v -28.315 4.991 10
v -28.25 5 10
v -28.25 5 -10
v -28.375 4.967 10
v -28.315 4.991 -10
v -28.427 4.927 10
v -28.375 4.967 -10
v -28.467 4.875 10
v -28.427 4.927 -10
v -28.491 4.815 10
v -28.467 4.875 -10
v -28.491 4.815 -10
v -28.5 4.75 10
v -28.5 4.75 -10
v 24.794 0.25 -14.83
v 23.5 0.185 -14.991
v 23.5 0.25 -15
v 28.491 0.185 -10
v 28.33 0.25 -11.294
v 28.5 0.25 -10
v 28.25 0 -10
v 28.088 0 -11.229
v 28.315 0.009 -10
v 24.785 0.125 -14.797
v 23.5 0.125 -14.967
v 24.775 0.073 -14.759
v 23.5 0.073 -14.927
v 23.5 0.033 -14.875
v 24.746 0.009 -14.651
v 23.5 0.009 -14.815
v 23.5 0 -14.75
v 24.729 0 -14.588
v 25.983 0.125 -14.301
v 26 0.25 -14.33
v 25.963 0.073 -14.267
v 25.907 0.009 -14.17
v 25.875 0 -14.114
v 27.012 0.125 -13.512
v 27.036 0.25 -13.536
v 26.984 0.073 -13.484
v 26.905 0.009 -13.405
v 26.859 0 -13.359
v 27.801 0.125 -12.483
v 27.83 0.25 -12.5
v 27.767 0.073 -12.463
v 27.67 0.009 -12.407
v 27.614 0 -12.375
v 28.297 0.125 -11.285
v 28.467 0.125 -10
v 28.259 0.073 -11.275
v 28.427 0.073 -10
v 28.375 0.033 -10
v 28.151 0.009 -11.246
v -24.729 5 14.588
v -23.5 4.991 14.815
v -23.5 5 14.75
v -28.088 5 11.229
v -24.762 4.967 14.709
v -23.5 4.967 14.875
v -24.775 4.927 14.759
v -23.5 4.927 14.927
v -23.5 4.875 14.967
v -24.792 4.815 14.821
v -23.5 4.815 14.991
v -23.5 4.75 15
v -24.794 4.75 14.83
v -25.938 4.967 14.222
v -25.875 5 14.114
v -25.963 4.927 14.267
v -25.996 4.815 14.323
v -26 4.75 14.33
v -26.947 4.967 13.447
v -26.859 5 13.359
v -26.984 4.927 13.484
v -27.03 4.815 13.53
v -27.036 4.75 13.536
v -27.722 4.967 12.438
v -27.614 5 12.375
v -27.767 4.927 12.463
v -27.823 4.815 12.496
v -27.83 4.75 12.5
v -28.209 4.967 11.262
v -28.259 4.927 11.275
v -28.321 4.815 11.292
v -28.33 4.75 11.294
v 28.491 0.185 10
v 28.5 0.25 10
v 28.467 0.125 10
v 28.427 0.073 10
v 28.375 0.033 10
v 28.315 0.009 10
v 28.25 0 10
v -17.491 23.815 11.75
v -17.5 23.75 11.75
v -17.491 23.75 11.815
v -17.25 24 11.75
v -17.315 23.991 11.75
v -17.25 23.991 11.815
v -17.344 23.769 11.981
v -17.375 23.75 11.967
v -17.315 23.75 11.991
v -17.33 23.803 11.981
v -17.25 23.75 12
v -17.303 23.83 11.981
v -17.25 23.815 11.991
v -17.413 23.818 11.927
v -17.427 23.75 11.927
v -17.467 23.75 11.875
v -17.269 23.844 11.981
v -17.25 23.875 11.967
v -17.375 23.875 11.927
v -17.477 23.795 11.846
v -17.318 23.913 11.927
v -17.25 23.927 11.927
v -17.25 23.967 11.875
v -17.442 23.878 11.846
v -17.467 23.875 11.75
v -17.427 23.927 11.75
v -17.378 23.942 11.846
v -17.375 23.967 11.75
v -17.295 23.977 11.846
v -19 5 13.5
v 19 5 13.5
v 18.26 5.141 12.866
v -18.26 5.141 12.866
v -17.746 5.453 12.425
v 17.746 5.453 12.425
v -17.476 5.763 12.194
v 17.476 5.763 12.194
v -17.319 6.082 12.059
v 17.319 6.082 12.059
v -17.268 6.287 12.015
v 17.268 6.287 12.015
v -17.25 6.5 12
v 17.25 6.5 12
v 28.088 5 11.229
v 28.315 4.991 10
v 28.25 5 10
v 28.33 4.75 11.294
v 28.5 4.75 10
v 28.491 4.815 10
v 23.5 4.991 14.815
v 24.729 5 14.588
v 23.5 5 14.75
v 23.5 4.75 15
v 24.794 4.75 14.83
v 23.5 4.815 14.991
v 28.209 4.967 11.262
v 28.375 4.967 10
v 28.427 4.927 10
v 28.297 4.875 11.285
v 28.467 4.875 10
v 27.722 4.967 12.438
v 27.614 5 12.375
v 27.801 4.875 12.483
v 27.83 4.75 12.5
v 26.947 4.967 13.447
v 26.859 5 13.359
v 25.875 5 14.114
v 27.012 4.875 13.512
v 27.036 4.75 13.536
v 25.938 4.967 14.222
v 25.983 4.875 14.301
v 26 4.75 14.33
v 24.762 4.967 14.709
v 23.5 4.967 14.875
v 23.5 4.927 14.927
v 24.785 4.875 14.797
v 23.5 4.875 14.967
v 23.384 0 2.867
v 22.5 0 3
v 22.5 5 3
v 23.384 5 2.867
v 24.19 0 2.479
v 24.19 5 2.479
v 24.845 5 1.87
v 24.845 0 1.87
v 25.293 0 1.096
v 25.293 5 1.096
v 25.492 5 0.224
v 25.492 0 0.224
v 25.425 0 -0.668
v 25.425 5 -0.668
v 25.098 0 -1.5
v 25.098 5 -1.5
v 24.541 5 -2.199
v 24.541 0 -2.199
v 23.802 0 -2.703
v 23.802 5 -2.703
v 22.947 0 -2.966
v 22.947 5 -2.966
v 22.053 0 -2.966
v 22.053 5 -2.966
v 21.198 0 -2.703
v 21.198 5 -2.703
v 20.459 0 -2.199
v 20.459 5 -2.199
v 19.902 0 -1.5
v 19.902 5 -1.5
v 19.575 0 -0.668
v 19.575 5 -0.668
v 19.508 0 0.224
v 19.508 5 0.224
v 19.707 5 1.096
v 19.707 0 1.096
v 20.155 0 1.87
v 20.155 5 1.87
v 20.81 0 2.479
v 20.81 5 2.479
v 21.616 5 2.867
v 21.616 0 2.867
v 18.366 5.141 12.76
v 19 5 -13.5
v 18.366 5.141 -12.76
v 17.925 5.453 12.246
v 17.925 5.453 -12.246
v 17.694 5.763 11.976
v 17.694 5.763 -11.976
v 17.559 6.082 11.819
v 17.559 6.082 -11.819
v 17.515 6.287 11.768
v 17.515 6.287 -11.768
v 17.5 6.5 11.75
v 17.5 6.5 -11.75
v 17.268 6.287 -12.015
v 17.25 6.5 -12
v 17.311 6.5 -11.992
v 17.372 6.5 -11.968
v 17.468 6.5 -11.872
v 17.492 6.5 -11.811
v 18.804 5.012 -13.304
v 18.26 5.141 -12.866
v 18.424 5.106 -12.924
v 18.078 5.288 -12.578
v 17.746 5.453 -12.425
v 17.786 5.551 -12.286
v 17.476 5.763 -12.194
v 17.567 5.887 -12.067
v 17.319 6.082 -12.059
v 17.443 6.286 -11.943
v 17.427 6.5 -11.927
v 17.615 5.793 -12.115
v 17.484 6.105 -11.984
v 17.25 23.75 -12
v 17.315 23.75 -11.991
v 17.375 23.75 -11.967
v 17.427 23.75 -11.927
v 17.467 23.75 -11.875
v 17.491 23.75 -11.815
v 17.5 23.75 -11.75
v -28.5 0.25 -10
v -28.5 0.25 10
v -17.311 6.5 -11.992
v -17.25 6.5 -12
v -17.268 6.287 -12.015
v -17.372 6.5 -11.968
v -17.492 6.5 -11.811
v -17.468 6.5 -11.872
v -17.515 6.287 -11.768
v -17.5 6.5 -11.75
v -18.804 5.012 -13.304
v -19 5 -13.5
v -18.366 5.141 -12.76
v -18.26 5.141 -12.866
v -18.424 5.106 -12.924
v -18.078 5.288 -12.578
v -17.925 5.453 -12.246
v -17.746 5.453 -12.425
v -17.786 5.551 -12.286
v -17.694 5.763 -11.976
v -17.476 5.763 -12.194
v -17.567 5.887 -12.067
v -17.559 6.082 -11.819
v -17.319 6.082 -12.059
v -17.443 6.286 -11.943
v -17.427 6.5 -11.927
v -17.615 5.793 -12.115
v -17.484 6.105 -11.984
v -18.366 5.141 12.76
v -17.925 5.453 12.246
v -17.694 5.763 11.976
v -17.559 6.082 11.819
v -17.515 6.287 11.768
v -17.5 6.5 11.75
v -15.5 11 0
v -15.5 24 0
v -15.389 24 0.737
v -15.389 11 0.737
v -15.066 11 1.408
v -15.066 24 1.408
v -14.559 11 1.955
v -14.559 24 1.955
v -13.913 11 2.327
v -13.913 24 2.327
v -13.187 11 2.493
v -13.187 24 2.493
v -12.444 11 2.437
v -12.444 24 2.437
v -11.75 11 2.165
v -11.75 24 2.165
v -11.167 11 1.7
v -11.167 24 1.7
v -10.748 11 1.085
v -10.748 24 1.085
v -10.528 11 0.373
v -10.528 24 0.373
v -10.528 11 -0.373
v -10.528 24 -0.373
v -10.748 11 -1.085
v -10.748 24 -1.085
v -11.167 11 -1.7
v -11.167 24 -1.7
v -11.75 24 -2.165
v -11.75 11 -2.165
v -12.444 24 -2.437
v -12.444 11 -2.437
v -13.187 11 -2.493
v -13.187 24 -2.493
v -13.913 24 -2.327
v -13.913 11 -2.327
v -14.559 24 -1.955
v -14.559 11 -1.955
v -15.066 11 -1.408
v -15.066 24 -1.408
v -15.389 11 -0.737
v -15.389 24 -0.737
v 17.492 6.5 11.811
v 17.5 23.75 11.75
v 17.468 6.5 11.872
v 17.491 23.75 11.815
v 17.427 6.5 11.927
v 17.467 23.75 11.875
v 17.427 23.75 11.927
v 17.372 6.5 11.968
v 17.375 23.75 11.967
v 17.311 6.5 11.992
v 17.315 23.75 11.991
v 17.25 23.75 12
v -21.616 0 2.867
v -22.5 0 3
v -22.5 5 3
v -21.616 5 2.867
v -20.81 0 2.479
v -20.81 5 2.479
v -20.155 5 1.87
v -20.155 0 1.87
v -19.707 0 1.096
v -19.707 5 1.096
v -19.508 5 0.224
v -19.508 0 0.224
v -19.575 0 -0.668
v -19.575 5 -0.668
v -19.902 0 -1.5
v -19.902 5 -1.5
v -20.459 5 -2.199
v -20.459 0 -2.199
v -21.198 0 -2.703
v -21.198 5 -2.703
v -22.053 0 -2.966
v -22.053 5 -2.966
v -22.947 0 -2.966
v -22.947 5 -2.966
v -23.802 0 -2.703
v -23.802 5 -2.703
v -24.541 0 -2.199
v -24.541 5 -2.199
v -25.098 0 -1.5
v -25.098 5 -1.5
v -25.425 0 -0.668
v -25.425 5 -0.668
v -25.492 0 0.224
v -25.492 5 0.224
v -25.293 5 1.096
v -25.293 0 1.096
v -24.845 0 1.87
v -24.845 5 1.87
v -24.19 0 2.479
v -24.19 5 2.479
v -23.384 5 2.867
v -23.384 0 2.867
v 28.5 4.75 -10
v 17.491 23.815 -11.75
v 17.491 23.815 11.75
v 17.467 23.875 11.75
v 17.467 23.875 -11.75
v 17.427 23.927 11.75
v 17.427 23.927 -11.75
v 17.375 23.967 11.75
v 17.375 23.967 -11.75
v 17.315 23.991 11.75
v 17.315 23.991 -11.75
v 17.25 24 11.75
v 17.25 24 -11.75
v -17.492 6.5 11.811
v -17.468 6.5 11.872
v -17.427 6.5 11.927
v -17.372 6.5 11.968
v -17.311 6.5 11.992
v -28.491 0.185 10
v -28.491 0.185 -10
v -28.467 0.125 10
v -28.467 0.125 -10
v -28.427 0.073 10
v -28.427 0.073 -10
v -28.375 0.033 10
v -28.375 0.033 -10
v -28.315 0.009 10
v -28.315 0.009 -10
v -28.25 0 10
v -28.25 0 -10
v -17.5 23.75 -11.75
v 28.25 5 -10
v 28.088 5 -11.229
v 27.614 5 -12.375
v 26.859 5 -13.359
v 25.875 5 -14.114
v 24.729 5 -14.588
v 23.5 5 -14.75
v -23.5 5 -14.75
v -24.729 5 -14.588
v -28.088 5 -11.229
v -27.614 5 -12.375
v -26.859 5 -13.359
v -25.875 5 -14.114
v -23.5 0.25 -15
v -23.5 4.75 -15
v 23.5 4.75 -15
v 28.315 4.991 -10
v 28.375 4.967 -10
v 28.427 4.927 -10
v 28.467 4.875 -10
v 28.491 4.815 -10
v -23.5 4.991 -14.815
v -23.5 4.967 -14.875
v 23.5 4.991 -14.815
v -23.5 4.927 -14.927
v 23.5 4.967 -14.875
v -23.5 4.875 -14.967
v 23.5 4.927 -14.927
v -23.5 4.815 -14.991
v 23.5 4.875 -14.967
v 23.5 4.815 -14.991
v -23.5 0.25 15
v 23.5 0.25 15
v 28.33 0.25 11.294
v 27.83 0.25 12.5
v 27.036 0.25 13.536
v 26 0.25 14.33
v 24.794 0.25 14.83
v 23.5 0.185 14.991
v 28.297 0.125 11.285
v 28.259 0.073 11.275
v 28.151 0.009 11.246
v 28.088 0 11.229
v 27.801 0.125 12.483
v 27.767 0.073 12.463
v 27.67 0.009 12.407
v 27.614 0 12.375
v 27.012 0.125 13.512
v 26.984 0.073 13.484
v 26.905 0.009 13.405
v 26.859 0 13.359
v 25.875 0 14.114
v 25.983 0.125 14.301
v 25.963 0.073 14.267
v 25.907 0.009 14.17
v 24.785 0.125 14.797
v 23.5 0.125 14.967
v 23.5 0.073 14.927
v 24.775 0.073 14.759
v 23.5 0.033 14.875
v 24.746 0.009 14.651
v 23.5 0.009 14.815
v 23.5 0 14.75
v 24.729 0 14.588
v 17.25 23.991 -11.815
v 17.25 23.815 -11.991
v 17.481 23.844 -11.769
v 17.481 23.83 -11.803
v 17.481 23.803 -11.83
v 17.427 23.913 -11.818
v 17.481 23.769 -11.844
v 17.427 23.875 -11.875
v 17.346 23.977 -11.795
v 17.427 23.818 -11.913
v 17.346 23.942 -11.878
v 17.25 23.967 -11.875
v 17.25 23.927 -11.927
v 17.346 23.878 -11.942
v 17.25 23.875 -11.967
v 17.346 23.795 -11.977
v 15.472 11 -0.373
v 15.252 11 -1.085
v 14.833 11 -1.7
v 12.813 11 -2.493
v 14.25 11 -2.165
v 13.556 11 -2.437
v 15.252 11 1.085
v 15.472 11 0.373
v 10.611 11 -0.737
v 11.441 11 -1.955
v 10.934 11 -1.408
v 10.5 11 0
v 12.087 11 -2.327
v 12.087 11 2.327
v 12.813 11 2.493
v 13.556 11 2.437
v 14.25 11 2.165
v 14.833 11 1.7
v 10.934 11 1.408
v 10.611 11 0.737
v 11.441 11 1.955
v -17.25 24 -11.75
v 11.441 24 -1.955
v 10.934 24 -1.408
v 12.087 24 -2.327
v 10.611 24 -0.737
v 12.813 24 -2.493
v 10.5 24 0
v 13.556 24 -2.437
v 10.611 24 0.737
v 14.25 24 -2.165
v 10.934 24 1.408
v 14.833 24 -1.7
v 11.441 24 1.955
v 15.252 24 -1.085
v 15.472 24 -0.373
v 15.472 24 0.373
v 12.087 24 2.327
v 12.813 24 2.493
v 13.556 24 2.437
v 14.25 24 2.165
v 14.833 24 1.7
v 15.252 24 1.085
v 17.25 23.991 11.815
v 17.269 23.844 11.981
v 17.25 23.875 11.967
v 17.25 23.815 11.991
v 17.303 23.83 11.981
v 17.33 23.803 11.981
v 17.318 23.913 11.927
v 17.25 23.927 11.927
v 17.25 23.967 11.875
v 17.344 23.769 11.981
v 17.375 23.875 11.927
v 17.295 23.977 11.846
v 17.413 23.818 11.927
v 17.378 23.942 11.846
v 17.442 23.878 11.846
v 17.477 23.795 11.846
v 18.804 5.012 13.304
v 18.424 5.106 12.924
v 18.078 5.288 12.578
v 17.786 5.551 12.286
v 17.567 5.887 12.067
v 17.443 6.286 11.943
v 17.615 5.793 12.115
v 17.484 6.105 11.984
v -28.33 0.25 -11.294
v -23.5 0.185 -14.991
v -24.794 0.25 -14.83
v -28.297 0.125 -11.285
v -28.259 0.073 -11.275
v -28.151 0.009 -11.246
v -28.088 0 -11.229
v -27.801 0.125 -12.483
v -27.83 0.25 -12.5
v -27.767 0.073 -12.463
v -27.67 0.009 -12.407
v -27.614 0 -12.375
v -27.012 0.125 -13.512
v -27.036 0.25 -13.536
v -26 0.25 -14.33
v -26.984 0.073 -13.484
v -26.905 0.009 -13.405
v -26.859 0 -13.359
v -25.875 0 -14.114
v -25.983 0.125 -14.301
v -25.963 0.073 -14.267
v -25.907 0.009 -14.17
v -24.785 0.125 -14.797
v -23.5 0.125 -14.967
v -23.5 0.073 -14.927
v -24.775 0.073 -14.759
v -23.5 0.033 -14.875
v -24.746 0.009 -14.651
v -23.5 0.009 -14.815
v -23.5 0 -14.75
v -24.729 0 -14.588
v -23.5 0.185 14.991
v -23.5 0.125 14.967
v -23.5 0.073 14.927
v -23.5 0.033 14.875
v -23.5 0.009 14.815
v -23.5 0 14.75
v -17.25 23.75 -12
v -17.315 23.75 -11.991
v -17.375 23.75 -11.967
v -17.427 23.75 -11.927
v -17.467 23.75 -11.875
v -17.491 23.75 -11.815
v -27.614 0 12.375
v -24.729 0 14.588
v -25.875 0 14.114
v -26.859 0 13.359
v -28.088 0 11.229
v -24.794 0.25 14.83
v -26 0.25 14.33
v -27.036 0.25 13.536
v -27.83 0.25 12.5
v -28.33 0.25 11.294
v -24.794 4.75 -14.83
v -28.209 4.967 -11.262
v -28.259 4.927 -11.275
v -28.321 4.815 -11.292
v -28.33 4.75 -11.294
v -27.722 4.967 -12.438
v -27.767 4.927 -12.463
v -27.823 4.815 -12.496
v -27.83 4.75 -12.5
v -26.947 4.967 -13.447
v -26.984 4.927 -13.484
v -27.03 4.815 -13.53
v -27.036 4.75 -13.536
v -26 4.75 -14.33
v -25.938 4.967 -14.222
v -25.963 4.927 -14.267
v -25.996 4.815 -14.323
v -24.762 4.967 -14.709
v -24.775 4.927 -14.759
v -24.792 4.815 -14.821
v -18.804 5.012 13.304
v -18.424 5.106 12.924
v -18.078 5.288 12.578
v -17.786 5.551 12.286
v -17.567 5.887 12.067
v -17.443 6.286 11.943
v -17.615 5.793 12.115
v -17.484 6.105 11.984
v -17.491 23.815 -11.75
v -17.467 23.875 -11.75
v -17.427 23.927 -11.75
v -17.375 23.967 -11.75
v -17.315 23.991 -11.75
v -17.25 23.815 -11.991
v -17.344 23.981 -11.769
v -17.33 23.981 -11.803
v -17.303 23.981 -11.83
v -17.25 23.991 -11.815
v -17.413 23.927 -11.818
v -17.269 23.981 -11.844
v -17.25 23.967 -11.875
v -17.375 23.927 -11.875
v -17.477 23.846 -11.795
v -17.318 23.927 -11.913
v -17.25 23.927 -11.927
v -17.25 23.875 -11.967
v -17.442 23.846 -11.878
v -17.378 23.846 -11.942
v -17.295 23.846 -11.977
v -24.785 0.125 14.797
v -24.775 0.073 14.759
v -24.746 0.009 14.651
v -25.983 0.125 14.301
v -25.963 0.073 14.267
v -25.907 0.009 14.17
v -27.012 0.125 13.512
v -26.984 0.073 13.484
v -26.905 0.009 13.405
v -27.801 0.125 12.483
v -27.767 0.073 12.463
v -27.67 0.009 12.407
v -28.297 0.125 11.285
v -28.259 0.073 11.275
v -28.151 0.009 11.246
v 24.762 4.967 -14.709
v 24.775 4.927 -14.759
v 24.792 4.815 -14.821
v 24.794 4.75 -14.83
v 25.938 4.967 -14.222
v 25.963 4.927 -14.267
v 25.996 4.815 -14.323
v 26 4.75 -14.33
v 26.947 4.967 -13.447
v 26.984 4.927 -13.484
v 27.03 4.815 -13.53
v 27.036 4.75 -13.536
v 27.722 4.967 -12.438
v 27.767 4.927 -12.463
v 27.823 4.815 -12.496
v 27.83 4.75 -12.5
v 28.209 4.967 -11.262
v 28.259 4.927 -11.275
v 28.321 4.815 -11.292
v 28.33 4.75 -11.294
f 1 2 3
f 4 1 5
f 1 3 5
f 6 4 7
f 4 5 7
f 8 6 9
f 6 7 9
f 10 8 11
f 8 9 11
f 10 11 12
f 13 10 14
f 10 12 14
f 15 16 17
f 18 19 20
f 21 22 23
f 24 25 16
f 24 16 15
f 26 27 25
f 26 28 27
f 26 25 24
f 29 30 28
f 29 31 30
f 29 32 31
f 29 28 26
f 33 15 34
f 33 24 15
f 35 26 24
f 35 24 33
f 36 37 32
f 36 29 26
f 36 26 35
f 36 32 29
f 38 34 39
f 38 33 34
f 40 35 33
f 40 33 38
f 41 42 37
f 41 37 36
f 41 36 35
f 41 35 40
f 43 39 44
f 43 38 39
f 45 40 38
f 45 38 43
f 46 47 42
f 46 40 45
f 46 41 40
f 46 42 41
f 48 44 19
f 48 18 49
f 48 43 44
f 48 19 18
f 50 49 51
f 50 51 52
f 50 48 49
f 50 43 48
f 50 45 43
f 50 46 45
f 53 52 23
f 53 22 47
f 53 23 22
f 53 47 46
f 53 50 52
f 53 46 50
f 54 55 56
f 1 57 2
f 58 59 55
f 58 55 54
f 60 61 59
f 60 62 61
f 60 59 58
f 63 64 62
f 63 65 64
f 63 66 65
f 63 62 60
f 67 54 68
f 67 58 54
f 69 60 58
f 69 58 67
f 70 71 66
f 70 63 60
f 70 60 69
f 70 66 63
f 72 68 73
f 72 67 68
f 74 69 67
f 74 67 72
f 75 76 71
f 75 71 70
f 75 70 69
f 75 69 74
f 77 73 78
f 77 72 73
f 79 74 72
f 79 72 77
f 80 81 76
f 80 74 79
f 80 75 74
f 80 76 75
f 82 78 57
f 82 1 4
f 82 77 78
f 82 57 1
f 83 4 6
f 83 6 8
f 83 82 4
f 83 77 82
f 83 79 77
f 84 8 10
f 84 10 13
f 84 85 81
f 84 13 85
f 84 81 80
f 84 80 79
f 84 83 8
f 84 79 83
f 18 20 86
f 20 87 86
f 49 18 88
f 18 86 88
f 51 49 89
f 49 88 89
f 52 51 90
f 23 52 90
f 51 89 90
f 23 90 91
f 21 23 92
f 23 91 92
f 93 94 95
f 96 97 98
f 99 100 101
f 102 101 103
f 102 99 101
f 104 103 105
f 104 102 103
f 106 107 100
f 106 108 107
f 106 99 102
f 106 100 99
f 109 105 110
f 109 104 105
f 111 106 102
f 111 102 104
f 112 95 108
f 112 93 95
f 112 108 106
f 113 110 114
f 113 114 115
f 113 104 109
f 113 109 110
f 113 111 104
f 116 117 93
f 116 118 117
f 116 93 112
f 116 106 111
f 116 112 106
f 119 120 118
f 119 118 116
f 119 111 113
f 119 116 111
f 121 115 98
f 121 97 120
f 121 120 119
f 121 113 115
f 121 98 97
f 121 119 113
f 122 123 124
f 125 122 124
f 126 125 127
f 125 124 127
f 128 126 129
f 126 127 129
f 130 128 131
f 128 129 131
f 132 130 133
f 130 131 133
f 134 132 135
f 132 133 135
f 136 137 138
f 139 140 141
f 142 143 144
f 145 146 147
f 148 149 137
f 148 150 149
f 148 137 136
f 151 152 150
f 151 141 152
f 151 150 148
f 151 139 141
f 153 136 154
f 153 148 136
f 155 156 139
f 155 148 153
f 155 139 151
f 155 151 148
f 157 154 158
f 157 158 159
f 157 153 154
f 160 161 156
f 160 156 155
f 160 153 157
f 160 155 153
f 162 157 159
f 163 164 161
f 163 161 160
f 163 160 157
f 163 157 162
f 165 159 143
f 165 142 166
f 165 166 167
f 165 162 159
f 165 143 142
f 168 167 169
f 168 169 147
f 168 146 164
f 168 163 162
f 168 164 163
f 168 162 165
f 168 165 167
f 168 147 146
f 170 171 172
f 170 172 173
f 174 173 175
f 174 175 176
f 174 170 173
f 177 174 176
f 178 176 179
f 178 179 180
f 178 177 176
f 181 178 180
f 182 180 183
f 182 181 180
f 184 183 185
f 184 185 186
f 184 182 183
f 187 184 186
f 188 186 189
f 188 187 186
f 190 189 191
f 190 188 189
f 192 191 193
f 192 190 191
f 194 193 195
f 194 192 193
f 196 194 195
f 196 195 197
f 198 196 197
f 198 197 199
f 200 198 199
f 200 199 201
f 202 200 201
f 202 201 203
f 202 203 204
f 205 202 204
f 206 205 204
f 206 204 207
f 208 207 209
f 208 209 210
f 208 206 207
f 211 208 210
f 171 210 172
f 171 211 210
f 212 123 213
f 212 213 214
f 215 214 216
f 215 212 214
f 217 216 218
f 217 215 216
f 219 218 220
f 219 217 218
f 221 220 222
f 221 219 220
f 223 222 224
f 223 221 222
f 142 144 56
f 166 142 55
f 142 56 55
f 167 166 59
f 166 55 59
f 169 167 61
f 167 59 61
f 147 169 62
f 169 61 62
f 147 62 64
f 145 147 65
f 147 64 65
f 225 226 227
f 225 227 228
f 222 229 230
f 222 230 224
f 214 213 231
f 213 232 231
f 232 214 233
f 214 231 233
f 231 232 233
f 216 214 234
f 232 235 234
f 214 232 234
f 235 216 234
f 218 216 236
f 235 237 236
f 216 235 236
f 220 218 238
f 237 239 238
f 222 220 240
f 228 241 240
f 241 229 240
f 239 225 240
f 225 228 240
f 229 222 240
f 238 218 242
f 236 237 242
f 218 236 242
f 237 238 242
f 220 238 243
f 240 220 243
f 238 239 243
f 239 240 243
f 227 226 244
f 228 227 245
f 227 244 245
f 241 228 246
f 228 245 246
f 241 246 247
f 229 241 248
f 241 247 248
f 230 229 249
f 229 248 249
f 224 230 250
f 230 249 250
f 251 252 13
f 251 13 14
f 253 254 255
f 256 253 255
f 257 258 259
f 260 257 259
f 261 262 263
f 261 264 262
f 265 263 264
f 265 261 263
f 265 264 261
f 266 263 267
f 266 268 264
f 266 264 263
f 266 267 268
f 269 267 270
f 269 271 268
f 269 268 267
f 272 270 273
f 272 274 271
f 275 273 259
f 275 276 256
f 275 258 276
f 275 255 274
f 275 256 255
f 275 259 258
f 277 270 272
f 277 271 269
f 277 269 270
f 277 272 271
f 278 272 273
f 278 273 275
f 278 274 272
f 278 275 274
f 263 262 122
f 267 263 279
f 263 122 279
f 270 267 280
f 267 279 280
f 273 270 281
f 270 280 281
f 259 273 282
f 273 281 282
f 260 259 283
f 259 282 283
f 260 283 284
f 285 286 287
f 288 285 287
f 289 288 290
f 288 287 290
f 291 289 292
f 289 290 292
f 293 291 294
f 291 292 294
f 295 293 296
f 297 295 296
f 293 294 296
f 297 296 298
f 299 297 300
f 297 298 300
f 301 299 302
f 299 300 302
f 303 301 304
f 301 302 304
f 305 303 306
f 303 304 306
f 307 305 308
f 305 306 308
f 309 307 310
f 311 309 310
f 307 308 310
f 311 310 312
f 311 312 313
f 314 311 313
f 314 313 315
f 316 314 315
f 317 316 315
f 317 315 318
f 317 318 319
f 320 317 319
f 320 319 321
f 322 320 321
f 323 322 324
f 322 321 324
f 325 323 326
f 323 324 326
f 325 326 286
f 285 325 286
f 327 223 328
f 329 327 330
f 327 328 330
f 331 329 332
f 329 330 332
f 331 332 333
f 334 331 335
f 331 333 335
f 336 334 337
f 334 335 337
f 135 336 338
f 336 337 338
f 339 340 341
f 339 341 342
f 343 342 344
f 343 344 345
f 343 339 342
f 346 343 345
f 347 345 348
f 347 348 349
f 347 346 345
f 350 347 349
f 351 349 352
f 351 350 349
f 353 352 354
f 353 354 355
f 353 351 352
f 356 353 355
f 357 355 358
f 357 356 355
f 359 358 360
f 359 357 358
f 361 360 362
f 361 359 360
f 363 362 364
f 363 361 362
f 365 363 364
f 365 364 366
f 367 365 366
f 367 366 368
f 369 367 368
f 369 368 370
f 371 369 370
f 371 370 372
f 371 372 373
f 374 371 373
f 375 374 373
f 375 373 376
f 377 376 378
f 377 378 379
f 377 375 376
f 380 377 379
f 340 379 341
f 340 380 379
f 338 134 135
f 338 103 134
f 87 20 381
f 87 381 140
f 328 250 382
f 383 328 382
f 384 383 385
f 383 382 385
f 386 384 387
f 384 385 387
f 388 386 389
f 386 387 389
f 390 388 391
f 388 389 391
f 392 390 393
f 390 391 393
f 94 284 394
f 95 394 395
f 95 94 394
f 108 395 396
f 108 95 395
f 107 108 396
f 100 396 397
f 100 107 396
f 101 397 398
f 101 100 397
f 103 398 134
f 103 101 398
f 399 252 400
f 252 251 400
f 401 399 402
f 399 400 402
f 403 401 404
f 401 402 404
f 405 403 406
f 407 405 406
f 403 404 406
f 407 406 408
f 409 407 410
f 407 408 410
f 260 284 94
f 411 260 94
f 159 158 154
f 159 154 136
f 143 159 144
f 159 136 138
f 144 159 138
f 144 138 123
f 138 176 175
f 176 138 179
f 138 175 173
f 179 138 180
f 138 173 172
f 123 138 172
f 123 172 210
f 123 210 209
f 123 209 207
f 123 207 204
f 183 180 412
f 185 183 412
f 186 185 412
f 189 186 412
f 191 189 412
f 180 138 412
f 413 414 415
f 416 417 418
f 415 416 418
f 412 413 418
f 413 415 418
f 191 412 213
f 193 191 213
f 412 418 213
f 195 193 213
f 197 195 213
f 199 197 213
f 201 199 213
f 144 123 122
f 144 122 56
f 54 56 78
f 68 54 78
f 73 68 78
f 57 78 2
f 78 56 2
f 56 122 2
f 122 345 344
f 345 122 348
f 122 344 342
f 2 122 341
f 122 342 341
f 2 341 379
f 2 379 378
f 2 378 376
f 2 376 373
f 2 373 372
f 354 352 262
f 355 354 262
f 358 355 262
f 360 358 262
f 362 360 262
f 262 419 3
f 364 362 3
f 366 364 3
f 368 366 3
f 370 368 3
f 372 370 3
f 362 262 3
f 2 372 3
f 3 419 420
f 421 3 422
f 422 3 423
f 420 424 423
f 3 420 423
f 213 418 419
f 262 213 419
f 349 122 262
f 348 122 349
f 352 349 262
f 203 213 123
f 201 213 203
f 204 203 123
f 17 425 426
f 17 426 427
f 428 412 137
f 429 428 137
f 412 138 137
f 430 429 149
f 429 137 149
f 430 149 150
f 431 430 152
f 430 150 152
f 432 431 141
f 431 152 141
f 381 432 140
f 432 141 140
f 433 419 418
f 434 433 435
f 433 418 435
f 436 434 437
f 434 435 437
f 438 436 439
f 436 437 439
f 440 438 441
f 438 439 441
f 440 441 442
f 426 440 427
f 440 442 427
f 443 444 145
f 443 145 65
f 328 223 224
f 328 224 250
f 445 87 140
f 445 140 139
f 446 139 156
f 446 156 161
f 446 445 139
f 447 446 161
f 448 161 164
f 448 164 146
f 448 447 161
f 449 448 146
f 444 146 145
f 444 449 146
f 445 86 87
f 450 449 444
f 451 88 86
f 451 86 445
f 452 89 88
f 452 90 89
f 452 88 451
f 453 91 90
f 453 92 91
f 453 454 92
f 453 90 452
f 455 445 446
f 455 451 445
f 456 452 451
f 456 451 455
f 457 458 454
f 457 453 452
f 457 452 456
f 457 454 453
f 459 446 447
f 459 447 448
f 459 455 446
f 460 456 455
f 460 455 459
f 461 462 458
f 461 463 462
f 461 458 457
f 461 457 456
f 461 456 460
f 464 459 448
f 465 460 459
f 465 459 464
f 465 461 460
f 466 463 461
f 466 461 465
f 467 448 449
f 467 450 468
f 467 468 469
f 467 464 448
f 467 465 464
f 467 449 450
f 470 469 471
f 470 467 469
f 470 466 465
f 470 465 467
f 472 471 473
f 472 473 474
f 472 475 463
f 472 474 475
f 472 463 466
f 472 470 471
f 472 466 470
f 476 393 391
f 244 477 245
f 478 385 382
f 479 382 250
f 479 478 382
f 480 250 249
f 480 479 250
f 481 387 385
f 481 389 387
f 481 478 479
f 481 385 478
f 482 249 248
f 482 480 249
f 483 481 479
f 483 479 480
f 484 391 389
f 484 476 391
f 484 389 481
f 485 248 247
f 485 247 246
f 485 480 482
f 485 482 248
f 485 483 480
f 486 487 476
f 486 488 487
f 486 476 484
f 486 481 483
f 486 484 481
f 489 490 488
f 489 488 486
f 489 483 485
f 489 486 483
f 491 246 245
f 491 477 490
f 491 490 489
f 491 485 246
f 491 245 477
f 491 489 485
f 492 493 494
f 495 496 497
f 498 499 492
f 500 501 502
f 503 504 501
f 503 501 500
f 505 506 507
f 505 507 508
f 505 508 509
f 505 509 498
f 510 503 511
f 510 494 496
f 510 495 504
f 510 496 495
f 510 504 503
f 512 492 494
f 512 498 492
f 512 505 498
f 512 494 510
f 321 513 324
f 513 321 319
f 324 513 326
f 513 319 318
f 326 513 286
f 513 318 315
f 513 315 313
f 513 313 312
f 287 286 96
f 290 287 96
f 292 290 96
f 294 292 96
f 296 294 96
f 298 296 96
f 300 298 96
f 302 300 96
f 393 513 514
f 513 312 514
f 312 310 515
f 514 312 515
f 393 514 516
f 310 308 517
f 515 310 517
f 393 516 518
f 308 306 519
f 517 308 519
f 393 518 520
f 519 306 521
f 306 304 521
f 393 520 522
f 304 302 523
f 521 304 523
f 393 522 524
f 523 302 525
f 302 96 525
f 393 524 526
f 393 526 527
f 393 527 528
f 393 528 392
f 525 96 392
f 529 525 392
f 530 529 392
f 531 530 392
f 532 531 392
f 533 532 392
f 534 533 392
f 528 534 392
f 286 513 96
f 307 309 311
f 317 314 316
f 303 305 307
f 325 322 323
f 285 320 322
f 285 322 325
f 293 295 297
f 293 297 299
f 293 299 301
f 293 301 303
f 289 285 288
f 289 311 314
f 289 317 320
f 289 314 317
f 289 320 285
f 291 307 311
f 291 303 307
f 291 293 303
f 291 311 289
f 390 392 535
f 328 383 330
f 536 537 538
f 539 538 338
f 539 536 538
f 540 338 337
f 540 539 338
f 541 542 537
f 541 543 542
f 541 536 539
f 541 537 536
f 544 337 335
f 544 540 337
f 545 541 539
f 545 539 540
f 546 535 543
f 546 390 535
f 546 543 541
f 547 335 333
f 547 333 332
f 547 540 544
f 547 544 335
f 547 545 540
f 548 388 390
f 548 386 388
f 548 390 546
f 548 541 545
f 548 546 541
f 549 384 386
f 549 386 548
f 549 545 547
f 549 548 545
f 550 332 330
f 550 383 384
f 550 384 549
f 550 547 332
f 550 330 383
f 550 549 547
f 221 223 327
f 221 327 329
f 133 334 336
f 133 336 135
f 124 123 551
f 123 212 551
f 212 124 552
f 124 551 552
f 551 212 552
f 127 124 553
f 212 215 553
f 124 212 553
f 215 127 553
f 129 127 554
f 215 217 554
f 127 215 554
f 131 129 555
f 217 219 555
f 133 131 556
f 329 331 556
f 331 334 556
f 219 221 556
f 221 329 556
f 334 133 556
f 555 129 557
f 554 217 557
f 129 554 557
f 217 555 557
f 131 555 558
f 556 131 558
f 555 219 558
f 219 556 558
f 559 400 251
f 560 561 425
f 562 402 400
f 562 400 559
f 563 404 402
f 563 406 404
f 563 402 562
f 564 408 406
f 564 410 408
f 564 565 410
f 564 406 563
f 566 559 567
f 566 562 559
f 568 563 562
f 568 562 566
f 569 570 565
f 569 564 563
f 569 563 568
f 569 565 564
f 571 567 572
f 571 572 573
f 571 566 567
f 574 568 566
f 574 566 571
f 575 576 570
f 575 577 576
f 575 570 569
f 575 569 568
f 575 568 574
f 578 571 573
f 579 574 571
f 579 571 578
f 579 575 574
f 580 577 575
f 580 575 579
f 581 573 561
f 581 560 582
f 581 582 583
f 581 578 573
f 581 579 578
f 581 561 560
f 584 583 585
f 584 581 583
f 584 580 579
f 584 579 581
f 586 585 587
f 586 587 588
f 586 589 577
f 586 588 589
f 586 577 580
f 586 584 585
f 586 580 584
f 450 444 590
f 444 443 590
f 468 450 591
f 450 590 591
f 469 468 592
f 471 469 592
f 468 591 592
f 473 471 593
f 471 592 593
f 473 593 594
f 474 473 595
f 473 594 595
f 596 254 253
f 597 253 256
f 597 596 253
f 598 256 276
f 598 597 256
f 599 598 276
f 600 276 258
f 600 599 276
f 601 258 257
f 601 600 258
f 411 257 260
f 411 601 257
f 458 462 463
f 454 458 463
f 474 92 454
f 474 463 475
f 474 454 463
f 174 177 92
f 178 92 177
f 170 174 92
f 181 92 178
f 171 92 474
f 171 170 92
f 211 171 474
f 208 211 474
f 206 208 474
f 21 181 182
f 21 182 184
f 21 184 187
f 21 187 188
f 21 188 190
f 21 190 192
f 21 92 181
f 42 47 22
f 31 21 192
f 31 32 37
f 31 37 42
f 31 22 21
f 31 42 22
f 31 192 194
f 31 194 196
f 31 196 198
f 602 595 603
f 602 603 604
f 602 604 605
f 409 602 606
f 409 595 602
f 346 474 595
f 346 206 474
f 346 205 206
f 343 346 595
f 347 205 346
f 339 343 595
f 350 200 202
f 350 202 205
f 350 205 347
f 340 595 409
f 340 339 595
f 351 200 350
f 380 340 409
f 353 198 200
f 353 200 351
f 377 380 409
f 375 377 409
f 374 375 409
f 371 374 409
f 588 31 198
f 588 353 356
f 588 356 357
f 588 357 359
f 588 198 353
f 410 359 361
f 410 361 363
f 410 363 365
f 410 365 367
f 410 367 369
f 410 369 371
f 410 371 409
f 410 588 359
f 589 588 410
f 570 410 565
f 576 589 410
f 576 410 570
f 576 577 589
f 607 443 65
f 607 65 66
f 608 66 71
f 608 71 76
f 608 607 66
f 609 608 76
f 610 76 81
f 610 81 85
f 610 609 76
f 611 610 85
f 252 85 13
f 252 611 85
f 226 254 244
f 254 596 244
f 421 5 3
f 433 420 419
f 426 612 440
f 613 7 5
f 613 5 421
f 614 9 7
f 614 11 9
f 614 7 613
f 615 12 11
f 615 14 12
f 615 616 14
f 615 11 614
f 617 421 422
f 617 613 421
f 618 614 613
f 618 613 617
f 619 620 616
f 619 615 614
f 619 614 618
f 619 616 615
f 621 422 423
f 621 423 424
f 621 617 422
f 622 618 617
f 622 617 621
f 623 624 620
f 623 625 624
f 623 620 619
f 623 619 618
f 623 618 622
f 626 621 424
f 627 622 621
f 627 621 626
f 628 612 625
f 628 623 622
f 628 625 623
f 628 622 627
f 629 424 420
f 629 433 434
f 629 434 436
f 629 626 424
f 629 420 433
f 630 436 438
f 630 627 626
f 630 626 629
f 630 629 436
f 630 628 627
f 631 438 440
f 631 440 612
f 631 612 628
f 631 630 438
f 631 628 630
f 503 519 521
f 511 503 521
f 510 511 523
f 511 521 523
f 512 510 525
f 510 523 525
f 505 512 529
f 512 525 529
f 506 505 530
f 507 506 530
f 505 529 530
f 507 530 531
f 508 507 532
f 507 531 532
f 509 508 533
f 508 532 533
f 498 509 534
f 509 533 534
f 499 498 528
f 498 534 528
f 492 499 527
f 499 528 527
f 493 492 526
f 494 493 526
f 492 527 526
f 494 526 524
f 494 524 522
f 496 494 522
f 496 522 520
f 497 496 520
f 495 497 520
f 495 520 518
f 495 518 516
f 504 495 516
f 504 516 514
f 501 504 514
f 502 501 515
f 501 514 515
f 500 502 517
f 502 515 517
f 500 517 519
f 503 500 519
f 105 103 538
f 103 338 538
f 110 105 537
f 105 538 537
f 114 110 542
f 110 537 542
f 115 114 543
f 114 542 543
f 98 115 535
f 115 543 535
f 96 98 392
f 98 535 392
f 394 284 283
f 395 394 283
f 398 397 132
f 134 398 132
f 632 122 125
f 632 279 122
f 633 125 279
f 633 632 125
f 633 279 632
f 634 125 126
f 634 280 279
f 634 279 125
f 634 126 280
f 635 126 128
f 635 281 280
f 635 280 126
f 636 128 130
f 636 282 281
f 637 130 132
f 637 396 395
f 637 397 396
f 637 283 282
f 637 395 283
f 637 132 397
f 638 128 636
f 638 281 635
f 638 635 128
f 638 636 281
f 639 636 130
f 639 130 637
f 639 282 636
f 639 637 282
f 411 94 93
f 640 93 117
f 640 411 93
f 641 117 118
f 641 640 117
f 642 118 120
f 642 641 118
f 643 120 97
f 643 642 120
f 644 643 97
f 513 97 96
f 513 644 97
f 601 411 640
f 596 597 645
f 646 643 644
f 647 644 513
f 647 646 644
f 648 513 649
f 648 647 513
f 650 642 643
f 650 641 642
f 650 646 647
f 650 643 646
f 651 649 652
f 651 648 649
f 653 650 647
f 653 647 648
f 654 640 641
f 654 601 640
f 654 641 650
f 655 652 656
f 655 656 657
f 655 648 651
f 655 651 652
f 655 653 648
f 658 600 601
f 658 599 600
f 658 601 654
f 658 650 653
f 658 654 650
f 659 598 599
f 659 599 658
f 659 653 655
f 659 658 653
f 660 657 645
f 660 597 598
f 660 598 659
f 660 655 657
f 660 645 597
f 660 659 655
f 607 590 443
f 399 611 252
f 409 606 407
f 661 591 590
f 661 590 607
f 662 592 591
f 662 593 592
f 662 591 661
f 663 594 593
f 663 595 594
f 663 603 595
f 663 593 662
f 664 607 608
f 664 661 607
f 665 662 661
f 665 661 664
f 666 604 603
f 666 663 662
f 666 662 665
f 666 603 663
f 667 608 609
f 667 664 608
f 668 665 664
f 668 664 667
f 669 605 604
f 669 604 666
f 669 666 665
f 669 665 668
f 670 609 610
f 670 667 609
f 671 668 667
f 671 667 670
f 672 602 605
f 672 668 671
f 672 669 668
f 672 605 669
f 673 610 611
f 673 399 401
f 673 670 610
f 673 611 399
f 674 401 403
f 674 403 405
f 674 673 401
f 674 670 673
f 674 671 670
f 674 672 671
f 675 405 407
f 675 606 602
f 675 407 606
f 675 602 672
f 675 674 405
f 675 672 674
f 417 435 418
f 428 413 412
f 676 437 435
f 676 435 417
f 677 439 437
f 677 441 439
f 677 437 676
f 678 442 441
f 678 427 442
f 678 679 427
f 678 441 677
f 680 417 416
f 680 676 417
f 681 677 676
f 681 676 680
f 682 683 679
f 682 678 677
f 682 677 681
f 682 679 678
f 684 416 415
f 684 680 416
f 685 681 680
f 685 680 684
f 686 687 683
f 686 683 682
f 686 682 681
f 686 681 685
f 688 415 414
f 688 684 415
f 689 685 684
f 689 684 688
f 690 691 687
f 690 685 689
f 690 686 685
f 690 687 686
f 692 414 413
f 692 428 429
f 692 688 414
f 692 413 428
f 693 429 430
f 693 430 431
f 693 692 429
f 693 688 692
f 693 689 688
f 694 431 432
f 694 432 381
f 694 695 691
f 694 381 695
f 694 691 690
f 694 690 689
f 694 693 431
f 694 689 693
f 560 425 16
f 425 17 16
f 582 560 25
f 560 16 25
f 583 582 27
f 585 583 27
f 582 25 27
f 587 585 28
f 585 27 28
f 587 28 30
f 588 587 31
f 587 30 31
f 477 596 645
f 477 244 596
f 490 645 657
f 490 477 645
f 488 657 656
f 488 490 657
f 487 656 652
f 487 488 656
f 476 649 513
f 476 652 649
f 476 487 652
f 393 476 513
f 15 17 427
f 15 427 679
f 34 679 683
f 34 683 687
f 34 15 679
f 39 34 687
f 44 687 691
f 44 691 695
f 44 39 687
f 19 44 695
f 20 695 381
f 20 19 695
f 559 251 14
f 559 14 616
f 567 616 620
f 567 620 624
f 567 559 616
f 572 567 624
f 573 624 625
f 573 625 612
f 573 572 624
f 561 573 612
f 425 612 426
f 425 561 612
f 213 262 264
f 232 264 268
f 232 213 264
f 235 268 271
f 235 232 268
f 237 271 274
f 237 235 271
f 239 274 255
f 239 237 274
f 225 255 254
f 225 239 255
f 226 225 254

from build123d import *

# Parameters (mm, degrees)
SKETCH1_R           = 3
BOSS_EXTRUDE1_DEPTH = 5
SKETCH2_W           = 35
SKETCH2_H           = 19
BOSS_EXTRUDE2_DEPTH = 12
SKETCH3_R           = 2.5
CUT_EXTRUDE1_DEPTH  = 13
FILLET1_R           = 1.5
FILLET2_R           = 0.25
FILLET3_R           = 0.25


with BuildPart() as part:
    # Sketch1 → Boss-Extrude1 (new body)
    with BuildSketch(Plane(origin=(0, 0, 0), x_dir=(1, 0, 0), z_dir=(0, 1, 0))):
        with BuildLine():
            Line((23.5, -15), (-23.5, -15))
            ThreePointArc((-23.5, -15), (-27.035533906, -13.535533906), (-28.5, -10))
            Line((-28.5, -10), (-28.5, 10))
            ThreePointArc((-28.5, 10), (-27.035533906, 13.535533906), (-23.5, 15))
            Line((-23.5, 15), (23.5, 15))
            ThreePointArc((23.5, 15), (27.035533906, 13.535533906), (28.5, 10))
            Line((28.5, 10), (28.5, -10))
            ThreePointArc((28.5, -10), (27.035533906, -13.535533906), (23.5, -15))
        make_face()
        with Locations(Location((-22.5, 0, 0), (0, 0, 270))):
            Circle(SKETCH1_R, mode=Mode.SUBTRACT)
        with Locations(Location((22.5, 0, 0), (0, 0, 270))):
            Circle(SKETCH1_R, mode=Mode.SUBTRACT)
    extrude(amount=BOSS_EXTRUDE1_DEPTH)

    # Sketch2 → Boss-Extrude2 (add, symmetric)
    with BuildSketch(Plane.XY):
        with Locations((0, 14.5)):
            Rectangle(SKETCH2_W, SKETCH2_H)
    extrude(amount=BOSS_EXTRUDE2_DEPTH, both=True)

    # Sketch3 → Cut-Extrude1 (cut)
    with BuildSketch(Plane(origin=(0, 24, 0), x_dir=(1, 0, 0), z_dir=(0, 1, 0))):
        with Locations(Location((-13, 0, 0), (0, 0, 180))):
            Circle(SKETCH3_R)
        with Locations(Location((13, 0, 0), (0, 0, 180))):
            Circle(SKETCH3_R)
    extrude(amount=-CUT_EXTRUDE1_DEPTH, mode=Mode.SUBTRACT)

    # Fillet1
    fillet1_edges = [part.edges().sort_by_distance(p)[0] for p in [
        (0, 5, -12),
        (-17.5, 5, 0),
        (17.5, 5, 0),
        (0, 5, 12),
    ]]
    fillet(fillet1_edges, radius=FILLET1_R)

    # Fillet2
    fillet2_edges = [part.edges().sort_by_distance(p)[0] for p in [
        (28.5, 0, 0),
        (27.035533906, 0, 13.535533906),
        (0, 0, 15),
        (-27.035533906, 0, 13.535533906),
        (27.035533906, 5, 13.535533906),
        (28.5, 5, 0),
        (27.035533906, 5, -13.535533906),
        (0, 5, -15),
        (-27.035533906, 5, -13.535533906),
        (-28.5, 5, 0),
        (-27.035533906, 5, 13.535533906),
        (-28.5, 0, 0),
        (0, 5, 15),
        (-27.035533906, 0, -13.535533906),
        (0, 0, -15),
        (27.035533906, 0, -13.535533906),
    ]]
    fillet(fillet2_edges, radius=FILLET2_R)

    # Fillet3
    fillet3_edges = [part.edges().sort_by_distance(p)[0] for p in [
        (-17.5, 15.25, -12),
        (-17.5, 24, 0),
        (0, 24, -12),
        (17.5, 24, 0),
        (-17.5, 15.25, 12),
        (0, 24, 12),
        (17.5, 15.25, -12),
        (17.5, 15.25, 12),
        (18.030926639, 5.355055975, 12.530926639),
        (18.030926639, 5.355055975, -12.530926639),
        (-18.030926639, 5.355055975, 12.530926639),
        (-18.030926639, 5.355055975, -12.530926639),
    ]]
    fillet(fillet3_edges, radius=FILLET3_R)


solid = part.part
